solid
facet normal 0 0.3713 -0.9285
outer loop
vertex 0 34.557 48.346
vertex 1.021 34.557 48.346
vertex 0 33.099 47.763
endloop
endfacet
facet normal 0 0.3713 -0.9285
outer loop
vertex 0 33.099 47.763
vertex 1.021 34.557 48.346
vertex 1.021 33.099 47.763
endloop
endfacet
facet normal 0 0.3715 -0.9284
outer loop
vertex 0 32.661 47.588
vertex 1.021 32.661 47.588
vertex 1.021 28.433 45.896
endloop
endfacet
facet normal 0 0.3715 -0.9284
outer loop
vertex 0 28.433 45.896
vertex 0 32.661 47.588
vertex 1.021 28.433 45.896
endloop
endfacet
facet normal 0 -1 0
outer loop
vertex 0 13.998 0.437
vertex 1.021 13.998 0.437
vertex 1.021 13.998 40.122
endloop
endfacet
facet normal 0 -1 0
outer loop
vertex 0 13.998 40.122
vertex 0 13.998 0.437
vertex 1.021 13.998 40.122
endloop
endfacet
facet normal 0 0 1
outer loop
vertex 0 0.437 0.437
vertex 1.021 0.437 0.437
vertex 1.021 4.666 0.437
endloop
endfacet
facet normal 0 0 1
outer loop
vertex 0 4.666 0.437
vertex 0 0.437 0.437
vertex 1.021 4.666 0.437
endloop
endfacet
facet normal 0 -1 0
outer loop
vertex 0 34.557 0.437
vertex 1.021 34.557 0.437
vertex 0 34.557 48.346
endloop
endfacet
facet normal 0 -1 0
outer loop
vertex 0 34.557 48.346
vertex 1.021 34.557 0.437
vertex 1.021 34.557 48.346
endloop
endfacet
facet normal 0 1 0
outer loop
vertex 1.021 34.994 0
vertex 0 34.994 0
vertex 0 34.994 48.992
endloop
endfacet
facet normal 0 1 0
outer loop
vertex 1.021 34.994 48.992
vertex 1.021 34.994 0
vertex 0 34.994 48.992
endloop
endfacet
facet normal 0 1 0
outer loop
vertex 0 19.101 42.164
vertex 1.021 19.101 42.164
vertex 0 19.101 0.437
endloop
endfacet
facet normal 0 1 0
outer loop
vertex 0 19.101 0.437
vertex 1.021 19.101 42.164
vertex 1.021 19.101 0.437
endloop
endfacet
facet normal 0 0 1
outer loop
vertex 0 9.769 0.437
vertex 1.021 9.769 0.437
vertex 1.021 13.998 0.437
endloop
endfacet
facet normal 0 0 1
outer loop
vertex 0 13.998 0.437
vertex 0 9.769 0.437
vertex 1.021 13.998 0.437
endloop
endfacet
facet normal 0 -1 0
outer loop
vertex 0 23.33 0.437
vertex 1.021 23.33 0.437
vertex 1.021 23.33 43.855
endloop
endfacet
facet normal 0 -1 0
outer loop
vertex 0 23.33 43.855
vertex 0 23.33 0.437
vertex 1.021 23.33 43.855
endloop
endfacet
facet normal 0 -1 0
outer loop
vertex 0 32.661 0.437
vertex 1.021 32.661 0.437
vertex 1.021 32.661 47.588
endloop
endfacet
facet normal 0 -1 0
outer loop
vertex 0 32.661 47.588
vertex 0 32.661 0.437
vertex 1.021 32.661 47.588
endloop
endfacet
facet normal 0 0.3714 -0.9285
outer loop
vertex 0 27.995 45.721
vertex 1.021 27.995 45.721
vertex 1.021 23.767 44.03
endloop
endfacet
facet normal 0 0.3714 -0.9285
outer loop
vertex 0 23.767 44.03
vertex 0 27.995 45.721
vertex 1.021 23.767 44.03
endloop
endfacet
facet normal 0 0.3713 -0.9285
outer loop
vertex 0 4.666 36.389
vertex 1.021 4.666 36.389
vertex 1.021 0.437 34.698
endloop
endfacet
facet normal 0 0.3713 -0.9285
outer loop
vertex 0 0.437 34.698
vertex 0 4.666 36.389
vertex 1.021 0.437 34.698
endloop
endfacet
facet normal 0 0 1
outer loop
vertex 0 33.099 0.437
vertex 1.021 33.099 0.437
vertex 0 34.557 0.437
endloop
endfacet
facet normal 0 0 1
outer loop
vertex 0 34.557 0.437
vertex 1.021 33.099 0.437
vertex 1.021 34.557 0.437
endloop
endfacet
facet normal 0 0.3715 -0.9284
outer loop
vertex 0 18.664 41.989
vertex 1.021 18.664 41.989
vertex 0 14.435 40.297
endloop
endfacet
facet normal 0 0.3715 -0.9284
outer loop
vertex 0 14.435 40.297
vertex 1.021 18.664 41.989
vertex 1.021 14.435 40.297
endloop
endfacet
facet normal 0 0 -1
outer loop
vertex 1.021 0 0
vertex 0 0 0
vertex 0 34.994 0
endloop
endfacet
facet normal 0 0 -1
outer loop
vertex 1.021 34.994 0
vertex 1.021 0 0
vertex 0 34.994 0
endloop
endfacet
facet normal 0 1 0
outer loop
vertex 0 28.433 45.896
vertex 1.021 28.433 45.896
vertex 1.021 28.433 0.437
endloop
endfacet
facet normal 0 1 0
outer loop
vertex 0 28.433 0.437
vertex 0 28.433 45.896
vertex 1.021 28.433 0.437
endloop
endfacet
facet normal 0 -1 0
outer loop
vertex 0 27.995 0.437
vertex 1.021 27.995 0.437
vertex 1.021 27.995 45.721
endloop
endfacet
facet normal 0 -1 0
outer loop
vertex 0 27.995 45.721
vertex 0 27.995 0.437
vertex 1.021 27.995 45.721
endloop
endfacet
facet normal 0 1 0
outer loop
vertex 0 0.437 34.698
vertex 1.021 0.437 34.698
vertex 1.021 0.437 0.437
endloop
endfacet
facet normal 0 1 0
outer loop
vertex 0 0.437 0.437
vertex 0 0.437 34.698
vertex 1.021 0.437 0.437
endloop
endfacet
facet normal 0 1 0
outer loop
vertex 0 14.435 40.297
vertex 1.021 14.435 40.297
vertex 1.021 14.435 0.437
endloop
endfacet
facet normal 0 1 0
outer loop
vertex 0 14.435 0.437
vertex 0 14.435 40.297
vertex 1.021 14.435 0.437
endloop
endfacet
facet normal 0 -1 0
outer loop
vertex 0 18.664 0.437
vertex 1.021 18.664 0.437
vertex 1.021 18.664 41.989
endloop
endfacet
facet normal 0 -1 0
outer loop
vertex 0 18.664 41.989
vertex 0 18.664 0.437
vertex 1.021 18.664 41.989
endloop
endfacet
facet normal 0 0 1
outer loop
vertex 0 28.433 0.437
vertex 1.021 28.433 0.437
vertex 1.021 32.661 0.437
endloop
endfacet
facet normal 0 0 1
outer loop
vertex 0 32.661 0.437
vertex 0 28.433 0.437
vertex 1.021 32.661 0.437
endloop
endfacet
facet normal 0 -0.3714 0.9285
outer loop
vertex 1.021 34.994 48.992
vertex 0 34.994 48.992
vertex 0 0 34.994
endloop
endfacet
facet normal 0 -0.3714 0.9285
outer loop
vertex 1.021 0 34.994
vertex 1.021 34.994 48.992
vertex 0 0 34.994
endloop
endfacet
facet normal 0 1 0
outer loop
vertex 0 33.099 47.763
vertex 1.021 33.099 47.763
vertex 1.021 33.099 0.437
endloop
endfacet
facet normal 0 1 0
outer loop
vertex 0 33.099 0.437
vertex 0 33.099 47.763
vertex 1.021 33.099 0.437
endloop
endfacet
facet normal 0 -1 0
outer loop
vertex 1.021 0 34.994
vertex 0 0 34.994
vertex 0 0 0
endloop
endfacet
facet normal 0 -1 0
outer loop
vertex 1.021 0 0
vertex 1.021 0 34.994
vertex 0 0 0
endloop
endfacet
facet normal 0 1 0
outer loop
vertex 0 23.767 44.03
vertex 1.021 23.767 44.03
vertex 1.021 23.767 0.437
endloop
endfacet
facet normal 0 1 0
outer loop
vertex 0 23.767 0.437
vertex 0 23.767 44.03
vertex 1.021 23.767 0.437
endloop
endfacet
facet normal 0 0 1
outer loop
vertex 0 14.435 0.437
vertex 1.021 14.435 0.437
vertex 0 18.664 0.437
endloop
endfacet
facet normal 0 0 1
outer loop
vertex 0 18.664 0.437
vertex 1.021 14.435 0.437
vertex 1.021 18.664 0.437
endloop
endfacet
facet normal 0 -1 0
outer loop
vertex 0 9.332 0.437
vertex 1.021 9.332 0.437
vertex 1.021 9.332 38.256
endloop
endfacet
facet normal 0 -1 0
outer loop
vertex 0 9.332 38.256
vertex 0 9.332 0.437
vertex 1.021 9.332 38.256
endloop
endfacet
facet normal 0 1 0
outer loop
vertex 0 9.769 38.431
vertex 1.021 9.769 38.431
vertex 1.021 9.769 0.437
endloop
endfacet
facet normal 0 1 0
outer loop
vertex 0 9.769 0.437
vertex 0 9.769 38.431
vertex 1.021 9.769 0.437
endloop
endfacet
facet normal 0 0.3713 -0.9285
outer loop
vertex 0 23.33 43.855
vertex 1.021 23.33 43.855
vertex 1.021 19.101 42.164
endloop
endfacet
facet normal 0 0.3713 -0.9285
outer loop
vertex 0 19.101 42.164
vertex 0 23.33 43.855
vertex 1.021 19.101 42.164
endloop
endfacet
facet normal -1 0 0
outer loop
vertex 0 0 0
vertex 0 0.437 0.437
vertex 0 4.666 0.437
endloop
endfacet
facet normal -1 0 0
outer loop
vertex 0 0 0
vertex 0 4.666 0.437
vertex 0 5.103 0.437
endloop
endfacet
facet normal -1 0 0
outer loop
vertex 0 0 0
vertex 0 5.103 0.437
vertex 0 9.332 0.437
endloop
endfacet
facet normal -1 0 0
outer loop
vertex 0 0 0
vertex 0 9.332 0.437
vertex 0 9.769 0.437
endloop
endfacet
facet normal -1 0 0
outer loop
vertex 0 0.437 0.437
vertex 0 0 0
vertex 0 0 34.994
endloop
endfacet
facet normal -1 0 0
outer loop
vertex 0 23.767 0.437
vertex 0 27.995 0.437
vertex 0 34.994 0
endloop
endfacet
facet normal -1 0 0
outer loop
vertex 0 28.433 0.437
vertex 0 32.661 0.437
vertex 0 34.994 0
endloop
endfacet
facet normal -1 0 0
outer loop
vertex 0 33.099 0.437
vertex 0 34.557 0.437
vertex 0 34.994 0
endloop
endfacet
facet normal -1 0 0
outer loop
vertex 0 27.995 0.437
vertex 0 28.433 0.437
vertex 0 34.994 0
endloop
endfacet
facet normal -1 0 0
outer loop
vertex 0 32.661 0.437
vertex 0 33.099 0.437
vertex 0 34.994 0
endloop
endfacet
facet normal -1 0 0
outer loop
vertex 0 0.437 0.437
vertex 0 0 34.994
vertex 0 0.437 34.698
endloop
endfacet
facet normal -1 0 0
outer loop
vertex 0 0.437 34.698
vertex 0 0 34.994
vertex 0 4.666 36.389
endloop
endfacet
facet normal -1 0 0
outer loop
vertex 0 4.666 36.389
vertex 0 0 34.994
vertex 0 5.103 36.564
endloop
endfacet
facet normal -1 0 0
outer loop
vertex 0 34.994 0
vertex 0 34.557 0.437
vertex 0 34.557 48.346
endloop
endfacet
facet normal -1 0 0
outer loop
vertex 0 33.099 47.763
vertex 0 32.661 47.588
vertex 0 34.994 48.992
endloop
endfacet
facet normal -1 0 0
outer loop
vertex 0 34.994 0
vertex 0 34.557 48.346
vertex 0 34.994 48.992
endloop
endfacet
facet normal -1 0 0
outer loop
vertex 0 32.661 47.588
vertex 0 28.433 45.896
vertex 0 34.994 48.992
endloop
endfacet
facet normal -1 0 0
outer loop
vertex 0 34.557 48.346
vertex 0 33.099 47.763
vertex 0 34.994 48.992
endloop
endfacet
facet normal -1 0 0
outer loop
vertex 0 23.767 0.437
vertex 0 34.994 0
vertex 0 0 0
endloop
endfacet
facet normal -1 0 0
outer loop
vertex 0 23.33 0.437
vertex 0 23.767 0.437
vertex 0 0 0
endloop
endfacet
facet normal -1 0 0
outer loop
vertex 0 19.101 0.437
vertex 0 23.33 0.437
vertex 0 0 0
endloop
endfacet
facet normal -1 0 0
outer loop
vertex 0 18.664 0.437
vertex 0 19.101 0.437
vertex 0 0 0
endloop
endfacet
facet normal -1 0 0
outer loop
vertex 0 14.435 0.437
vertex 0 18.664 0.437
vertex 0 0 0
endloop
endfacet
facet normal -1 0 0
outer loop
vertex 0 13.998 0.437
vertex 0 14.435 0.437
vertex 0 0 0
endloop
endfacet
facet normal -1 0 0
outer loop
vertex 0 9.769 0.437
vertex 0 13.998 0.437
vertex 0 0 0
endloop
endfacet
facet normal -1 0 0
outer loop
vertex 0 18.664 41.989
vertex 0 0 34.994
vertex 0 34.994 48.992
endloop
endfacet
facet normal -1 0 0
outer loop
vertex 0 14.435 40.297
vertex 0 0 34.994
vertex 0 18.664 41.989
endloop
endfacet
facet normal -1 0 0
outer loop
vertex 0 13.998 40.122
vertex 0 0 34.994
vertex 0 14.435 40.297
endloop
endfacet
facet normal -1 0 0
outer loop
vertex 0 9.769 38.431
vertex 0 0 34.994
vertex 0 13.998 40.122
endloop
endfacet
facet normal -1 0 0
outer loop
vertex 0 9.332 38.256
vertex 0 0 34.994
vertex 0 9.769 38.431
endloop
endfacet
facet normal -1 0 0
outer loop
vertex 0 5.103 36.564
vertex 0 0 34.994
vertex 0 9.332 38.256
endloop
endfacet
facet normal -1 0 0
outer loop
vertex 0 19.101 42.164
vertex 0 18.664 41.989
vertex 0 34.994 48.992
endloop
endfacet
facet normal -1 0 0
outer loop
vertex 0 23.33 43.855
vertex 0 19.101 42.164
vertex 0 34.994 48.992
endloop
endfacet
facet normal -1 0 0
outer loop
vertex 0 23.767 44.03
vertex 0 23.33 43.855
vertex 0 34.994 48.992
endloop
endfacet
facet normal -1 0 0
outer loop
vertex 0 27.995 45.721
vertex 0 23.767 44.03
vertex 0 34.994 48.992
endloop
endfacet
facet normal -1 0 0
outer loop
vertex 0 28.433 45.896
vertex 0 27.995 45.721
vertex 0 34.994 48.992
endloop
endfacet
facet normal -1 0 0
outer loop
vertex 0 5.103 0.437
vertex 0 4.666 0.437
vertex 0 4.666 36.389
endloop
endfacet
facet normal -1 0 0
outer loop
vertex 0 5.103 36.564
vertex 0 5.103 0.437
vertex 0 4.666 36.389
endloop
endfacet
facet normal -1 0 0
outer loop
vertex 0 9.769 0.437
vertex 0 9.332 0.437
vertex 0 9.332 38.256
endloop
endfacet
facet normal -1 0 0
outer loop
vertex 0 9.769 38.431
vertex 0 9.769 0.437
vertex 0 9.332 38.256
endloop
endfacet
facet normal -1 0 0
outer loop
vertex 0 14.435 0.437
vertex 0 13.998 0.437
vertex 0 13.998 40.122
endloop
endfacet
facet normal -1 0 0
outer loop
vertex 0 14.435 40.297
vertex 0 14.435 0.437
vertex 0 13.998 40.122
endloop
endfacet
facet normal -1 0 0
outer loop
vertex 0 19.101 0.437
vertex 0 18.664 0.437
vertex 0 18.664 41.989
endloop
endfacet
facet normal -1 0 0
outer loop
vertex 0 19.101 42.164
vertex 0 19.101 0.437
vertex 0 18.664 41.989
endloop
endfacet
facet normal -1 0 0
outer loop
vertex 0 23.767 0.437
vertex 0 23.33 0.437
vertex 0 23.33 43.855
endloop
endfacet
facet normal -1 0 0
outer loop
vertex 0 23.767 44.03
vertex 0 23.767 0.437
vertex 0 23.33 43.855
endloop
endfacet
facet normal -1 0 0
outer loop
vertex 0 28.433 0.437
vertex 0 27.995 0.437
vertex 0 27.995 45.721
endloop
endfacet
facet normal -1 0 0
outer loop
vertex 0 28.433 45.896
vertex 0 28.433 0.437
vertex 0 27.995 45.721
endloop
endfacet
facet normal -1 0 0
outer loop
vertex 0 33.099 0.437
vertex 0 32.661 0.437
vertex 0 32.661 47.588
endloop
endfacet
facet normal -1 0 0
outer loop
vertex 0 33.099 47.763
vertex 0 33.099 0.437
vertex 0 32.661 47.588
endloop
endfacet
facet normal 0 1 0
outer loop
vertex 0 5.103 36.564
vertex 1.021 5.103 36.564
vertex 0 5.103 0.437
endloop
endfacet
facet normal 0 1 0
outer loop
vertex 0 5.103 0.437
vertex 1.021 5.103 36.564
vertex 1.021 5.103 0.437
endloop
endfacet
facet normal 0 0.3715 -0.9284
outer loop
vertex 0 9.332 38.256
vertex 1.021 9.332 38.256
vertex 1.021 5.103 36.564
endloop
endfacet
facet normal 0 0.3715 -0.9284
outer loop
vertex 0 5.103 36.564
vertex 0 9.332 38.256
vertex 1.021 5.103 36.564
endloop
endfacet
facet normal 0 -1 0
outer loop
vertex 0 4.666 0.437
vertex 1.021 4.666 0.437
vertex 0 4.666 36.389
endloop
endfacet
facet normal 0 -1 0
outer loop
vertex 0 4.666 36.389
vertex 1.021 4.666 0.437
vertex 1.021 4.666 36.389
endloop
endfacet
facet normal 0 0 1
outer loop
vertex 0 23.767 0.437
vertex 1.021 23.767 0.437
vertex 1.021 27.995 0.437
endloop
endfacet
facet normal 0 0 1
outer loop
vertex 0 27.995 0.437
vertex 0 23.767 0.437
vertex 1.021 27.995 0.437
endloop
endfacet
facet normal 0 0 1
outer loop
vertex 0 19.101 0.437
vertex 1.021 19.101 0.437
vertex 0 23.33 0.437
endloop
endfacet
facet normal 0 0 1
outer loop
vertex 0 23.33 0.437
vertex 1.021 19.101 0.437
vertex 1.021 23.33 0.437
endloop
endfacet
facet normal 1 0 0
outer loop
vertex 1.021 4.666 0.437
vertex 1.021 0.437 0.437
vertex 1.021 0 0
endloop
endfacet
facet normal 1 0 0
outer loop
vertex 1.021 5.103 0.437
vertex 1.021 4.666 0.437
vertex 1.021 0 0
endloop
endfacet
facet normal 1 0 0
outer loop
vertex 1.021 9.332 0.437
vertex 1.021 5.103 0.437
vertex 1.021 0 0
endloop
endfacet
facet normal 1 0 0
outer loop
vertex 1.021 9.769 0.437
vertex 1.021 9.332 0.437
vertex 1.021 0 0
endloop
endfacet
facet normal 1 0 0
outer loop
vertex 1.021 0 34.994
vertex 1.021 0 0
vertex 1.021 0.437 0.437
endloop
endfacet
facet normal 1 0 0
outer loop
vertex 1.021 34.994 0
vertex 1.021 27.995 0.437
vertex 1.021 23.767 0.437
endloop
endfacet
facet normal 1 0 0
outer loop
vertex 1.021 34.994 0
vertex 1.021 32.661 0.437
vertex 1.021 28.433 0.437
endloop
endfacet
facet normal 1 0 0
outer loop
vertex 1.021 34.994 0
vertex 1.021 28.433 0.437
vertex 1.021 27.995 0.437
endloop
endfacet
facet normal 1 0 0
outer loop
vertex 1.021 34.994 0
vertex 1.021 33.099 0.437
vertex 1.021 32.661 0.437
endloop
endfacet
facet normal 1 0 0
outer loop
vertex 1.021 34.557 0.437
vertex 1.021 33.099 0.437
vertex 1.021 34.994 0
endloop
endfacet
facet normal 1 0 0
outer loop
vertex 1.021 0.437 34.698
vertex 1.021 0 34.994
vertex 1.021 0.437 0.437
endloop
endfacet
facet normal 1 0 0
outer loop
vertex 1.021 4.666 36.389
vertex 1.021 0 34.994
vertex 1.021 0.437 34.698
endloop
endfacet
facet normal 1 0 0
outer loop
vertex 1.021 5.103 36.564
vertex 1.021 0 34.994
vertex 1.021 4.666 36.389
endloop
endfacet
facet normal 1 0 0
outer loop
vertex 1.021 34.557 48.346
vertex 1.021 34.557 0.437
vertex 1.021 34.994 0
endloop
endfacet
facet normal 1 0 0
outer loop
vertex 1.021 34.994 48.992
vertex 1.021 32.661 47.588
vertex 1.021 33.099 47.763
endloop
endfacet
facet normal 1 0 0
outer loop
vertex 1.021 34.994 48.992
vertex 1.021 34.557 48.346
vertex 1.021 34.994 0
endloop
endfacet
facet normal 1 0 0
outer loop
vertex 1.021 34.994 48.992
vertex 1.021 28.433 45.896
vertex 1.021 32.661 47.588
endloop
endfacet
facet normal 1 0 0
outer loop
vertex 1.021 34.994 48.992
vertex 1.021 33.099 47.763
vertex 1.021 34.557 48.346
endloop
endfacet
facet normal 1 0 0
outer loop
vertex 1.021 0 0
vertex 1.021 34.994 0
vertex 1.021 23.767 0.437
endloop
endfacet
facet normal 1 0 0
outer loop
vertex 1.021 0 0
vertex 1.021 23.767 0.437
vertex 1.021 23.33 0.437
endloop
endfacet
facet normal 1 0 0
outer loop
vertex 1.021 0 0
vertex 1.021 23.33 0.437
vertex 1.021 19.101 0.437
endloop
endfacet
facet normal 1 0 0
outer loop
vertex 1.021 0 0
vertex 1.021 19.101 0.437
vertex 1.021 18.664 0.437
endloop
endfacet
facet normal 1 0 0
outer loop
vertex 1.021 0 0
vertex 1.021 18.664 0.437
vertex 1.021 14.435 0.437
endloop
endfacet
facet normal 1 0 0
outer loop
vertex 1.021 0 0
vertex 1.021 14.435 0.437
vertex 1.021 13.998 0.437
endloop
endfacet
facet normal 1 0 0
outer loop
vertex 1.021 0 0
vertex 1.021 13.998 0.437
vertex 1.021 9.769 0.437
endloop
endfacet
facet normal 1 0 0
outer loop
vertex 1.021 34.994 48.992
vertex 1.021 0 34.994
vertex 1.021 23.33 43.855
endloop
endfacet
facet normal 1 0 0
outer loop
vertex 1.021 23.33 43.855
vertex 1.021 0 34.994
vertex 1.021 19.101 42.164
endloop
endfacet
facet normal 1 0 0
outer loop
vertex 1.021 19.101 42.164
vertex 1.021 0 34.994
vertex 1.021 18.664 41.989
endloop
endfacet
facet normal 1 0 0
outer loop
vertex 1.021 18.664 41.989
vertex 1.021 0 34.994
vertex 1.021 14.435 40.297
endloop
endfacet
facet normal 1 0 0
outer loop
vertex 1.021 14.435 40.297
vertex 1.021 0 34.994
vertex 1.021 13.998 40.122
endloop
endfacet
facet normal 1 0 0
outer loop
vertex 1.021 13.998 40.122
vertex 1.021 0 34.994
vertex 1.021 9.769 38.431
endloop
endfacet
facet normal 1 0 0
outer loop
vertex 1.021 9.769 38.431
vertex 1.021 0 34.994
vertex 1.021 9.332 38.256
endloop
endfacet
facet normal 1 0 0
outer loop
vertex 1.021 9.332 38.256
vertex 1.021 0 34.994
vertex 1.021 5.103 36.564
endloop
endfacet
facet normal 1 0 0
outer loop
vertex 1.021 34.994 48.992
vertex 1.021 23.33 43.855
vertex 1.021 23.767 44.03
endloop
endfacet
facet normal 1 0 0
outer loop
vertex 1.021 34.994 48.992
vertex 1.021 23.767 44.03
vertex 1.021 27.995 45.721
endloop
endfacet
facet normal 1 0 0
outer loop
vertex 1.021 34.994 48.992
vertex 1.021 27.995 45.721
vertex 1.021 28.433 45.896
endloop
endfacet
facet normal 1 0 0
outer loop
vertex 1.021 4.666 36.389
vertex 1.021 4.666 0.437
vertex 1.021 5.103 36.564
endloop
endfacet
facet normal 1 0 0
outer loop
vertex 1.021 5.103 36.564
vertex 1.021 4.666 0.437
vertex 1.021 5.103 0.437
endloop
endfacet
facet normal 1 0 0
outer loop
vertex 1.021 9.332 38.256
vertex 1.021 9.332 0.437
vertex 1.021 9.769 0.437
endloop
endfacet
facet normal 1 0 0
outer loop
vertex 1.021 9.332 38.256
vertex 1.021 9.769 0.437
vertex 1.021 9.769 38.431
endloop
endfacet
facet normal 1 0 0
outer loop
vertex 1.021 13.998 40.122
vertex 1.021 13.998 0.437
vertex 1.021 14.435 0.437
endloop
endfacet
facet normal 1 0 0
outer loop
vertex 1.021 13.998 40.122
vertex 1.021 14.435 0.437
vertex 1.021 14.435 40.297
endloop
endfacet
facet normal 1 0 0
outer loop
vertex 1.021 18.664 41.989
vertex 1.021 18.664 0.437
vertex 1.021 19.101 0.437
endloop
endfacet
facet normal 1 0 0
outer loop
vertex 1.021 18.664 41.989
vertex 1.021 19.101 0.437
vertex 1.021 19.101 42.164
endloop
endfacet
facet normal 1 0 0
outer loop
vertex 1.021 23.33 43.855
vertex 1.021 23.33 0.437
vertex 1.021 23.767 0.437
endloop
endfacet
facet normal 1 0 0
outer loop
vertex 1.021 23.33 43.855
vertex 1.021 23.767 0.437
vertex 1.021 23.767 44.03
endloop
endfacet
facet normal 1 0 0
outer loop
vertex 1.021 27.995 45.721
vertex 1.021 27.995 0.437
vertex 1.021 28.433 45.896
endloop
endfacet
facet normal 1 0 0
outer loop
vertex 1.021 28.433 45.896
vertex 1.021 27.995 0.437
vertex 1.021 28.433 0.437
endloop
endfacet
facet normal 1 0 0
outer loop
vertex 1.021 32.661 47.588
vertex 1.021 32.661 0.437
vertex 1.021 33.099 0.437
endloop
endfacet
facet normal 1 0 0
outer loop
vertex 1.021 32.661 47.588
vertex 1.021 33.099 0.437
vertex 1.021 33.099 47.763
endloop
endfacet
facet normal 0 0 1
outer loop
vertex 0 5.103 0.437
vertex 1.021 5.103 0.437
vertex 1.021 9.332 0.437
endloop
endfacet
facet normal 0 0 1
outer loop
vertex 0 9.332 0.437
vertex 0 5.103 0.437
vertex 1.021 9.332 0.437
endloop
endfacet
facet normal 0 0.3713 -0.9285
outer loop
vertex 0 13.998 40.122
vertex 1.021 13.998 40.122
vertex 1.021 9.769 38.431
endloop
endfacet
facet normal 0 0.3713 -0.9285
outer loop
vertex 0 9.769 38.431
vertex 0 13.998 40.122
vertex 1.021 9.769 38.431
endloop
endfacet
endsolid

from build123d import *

# Parameters (mm, degrees)
F1_DEPTH = 88.9
F3_DEPTH = 88.901
F4_SCALE = 0.0114810563


with BuildPart() as f1:
    # F0 (on Right) → F1 (new body)
    with BuildSketch(Plane.YZ):
        Polygon((0, 3048), (0, 0), (3048, 0), (3048, 4267.2), align=None)
    extrude(amount=F1_DEPTH)

    # F2 (on face) → F3 (cut, through all)
    with BuildSketch(Plane.YZ.offset(88.9)):
        Polygon((406.4, 3169.5250441696), (38.1, 3022.2050441696), (38.1, 38.1), (406.4, 38.1), align=None)
        Polygon((812.8, 3332.0850441696), (444.5, 3184.7650441696), (444.5, 38.1), (812.8, 38.1), align=None)
        Polygon((1219.2, 3494.6450441696), (850.9, 3347.3250441696), (850.9, 38.1), (1219.2, 38.1), align=None)
        Polygon((1625.6, 3657.2050441696), (1257.3, 3509.8850441696), (1257.3, 38.1), (1625.6, 38.1), align=None)
        Polygon((2032, 3819.7650441696), (1663.7, 3672.4450441696), (1663.7, 38.1), (2032, 38.1), align=None)
        Polygon((2438.4, 3982.3250441696), (2070.1, 3835.0050441696), (2070.1, 38.1), (2438.4, 38.1), align=None)
        Polygon((2844.8, 4144.8850441696), (2476.5, 3997.5650441696), (2476.5, 38.1), (2844.8, 38.1), align=None)
        Polygon((3009.9, 4210.9250441696), (2882.9, 4160.1250441696), (2882.9, 38.1), (3009.9, 38.1), align=None)
    extrude(amount=-F3_DEPTH, mode=Mode.SUBTRACT)


with BuildPart() as f1_1:
    # F4: moved
    add(f1.part.scale(F4_SCALE))


solid = f1_1.part
